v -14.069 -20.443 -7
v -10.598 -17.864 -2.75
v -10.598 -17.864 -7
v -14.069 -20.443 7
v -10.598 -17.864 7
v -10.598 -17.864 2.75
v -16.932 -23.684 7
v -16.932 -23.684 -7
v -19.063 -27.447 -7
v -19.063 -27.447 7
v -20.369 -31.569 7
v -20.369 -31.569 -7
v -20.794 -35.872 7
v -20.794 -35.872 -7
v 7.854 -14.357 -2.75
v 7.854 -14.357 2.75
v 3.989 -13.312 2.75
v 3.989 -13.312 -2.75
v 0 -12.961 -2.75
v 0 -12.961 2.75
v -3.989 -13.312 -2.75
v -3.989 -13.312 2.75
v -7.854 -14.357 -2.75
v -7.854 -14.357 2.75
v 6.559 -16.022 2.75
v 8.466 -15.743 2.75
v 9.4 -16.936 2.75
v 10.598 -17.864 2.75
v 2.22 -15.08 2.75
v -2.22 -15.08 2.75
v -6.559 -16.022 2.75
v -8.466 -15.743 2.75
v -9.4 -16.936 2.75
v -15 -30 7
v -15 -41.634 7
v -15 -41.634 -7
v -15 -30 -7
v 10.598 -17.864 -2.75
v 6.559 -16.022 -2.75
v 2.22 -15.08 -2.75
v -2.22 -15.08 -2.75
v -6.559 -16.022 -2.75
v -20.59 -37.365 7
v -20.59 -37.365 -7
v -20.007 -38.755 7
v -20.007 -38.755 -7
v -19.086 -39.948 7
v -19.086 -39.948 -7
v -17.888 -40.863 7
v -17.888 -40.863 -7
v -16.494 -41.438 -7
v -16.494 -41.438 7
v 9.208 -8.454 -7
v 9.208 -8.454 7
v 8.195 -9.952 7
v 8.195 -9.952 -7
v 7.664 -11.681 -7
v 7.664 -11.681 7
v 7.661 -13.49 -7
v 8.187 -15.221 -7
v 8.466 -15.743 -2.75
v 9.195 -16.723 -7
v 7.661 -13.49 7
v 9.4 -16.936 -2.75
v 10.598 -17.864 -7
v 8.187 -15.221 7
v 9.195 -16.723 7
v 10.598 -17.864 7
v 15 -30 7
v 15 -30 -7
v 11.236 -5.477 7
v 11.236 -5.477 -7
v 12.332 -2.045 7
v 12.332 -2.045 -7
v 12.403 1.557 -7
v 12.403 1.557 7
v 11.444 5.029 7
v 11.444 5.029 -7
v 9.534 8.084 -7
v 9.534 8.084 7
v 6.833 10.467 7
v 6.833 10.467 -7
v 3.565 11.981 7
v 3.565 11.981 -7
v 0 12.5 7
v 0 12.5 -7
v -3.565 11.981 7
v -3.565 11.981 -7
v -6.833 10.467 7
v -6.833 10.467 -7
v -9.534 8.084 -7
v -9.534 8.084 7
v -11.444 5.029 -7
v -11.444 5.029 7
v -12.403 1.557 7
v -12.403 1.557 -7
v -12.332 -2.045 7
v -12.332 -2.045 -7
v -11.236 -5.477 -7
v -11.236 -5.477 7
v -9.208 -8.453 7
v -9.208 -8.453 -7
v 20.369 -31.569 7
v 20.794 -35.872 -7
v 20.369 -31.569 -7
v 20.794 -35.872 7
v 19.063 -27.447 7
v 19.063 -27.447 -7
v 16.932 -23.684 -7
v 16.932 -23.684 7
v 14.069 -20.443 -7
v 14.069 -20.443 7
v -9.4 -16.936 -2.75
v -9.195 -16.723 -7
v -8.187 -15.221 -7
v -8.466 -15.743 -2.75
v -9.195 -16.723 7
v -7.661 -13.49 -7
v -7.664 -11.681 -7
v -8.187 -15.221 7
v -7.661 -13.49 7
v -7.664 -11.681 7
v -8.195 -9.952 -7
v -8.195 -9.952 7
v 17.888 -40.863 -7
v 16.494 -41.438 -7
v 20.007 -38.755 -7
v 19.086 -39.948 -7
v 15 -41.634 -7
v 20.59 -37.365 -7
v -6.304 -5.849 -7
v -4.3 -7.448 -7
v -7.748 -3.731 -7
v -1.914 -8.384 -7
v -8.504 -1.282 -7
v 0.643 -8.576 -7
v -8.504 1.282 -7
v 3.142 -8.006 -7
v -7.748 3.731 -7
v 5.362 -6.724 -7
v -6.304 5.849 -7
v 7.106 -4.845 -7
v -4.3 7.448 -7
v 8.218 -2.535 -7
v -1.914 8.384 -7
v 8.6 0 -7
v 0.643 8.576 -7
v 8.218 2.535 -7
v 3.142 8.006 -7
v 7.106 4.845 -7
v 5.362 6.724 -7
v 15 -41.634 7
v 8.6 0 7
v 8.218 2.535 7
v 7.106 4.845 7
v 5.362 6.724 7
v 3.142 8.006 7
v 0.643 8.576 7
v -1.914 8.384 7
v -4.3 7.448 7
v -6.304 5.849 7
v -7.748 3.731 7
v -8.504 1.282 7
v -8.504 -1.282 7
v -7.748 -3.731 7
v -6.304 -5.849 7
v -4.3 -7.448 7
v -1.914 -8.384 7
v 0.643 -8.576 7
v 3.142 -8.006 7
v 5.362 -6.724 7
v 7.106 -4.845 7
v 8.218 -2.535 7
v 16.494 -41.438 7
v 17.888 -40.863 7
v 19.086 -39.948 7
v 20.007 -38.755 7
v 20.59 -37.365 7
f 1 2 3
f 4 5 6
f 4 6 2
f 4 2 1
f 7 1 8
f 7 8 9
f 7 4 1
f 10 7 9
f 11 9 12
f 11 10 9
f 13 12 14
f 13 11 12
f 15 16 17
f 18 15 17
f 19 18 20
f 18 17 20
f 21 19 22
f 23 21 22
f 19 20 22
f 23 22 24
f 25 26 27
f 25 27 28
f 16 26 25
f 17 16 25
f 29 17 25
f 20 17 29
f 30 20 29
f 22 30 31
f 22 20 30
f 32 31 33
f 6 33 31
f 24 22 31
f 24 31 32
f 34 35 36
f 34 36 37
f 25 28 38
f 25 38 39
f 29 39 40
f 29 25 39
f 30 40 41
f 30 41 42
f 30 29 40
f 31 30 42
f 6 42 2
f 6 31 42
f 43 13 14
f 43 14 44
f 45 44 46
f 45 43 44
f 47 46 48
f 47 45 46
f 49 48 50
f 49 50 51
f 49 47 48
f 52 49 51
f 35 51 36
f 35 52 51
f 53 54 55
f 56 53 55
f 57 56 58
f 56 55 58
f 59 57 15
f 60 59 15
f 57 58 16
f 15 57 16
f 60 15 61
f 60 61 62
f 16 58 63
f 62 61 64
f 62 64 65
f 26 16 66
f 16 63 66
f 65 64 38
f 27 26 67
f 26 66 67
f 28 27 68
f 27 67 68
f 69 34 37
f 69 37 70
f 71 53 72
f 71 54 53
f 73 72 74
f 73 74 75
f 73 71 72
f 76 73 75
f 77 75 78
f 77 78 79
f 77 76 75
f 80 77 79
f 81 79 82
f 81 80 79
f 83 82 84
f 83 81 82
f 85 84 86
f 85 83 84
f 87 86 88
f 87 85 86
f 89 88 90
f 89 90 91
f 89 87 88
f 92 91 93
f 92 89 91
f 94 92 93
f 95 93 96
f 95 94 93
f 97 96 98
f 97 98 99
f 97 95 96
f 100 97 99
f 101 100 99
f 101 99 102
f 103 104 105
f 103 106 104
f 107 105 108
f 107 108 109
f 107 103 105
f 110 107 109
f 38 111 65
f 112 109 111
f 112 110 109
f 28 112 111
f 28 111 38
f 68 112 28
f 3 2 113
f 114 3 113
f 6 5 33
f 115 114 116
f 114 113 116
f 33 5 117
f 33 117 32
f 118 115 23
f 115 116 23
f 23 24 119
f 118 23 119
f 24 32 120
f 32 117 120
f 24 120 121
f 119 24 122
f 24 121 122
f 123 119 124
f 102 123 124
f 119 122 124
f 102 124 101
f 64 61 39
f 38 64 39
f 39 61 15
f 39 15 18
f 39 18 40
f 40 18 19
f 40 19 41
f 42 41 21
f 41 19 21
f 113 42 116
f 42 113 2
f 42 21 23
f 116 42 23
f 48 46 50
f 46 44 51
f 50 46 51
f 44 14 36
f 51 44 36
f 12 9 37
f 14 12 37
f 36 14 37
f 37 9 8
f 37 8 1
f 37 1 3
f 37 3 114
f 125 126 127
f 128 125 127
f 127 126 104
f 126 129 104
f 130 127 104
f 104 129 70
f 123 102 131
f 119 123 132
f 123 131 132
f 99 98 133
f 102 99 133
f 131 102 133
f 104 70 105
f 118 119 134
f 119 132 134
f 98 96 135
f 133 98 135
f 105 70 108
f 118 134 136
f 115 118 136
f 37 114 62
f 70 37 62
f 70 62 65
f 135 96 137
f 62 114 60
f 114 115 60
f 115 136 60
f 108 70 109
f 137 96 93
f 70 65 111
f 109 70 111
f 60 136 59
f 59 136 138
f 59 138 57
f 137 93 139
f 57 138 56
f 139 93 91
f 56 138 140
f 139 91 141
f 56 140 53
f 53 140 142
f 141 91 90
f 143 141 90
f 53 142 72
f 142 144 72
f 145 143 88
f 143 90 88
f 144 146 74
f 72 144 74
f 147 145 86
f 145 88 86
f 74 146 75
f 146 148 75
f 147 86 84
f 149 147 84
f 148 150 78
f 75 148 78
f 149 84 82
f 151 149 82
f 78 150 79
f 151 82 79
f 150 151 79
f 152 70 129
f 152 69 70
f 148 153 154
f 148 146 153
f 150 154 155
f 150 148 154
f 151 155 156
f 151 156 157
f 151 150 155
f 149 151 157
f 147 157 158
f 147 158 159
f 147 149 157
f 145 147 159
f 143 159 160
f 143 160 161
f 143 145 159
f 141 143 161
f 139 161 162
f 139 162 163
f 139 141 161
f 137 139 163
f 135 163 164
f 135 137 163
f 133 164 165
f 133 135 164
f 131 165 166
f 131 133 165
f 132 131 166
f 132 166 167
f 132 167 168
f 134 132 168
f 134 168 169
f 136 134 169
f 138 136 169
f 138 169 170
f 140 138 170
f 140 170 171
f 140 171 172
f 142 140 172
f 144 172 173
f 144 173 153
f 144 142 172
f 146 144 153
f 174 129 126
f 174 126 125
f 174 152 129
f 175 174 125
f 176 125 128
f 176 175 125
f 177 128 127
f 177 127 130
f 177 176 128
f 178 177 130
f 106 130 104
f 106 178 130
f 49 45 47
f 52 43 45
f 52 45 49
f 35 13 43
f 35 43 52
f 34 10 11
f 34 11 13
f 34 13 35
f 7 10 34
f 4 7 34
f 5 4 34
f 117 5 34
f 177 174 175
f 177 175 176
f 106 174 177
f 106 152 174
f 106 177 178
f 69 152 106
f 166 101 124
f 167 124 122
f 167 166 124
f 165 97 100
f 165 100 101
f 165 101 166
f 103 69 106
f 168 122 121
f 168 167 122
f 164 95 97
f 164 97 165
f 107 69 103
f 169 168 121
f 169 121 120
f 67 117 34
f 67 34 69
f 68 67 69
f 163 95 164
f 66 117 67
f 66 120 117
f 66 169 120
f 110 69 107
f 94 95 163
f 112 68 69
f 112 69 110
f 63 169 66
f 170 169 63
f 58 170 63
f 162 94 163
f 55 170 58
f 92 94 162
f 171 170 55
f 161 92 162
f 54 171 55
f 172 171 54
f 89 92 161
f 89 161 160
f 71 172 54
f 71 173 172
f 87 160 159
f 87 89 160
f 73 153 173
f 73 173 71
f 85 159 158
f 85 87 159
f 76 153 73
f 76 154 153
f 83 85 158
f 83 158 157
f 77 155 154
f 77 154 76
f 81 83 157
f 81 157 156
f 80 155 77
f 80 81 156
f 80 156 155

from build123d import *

# Parameters (mm, degrees)
SKETCH_R     = 8.6
PAD_DEPTH    = 7
POCKET_DEPTH = 2.75


with BuildPart() as part:
    # Sketch → Pad (new body, symmetric)
    with BuildSketch(Plane.XY):
        with BuildLine():
            ThreePointArc((9.208059, -8.4535), (0, 12.5), (-9.208059, -8.4535))
            ThreePointArc((-10.598151, -17.864192), (-7.660974, -13.49004), (-9.208059, -8.4535))
            ThreePointArc((-10.598151, -17.864192), (-18.095301, -25.509629), (-20.794271, -35.871845))
            ThreePointArc((-20.794271, -35.871845), (-19.085742, -39.948082), (-15, -41.633753))
            Line((-15, -41.633753), (-15, -30))
            Line((-15, -30), (15, -30))
            Line((15, -30), (15, -41.633753))
            ThreePointArc((15, -41.633753), (19.085742, -39.948082), (20.794271, -35.871845))
            ThreePointArc((20.794271, -35.871845), (18.095301, -25.509629), (10.598151, -17.864192))
            ThreePointArc((9.208059, -8.4535), (7.660974, -13.49004), (10.598151, -17.864192))
        make_face()
        Circle(SKETCH_R, mode=Mode.SUBTRACT)
    extrude(amount=PAD_DEPTH, both=True)

    # Sketch001 → Pocket (cut, symmetric)
    with BuildSketch(Plane.XY):
        with BuildLine():
            ThreePointArc((10.598151, -17.864192), (0, -14.960779), (-10.598151, -17.864192))
            Line((-11.617468, -16.143439), (-10.598151, -17.864192))
            ThreePointArc((11.617468, -16.143439), (0, -12.960779), (-11.617468, -16.143439))
            Line((11.617468, -16.143439), (10.598151, -17.864192))
        make_face()
    extrude(amount=POCKET_DEPTH, both=True, mode=Mode.SUBTRACT)


solid = part.part
